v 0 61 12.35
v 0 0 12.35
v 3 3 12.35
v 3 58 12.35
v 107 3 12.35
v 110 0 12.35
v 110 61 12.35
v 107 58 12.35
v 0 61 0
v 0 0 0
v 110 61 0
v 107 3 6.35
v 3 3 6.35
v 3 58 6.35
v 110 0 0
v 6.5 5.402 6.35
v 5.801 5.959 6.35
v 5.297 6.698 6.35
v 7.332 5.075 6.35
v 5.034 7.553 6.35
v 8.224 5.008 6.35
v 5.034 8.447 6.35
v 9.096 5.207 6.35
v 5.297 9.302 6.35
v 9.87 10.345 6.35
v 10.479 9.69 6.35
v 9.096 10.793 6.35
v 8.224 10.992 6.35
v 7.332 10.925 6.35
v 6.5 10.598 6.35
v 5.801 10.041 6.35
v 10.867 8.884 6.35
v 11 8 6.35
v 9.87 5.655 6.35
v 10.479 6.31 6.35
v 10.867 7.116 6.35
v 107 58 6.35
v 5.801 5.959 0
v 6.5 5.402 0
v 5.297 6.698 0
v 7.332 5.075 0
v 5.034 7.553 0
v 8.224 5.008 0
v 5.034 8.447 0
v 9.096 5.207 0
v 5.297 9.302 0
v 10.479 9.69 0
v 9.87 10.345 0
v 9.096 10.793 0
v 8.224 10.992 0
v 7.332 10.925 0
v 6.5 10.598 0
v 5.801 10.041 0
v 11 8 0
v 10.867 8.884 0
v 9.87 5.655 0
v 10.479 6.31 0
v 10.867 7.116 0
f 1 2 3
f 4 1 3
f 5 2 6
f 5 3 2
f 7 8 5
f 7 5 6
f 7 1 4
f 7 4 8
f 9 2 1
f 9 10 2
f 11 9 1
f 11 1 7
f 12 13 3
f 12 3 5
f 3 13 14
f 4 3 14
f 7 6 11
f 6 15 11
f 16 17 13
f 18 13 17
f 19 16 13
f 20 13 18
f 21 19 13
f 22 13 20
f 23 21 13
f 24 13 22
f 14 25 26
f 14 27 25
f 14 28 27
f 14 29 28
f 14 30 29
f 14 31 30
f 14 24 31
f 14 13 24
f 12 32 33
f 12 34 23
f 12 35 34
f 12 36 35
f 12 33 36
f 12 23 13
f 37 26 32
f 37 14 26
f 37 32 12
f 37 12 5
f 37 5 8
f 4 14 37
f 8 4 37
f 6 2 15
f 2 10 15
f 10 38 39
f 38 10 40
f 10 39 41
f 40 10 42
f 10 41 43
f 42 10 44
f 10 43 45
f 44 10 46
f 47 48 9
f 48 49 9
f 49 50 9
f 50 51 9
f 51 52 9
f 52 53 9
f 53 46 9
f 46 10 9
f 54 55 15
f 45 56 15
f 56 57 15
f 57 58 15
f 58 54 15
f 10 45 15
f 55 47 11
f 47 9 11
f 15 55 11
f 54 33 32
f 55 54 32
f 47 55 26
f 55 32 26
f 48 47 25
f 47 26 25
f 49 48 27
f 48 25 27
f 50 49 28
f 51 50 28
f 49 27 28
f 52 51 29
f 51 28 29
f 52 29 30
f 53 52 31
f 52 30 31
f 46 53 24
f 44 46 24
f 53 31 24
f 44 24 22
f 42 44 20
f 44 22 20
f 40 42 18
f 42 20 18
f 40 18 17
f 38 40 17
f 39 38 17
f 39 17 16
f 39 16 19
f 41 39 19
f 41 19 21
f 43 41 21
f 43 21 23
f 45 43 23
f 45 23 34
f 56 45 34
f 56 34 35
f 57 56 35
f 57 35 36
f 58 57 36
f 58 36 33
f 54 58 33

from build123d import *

# Parameters (mm, degrees)
SKETCH1_W           = 110
SKETCH1_H           = 61
BOSS_EXTRUDE1_DEPTH = 6.35
SKETCH3_W           = 110
SKETCH3_H           = 61
SKETCH3_W_2         = 104
SKETCH3_H_2         = 55
BOSS_EXTRUDE2_DEPTH = 6
SKETCH5_R           = 3
CUT_EXTRUDE1_DEPTH  = 126.941742484


with BuildPart() as part:
    # Sketch1 → Boss-Extrude1 (new body)
    with BuildSketch(Plane.XY):
        with Locations((55, 30.5)):
            Rectangle(SKETCH1_W, SKETCH1_H)
    extrude(amount=BOSS_EXTRUDE1_DEPTH)

    # Sketch3 → Boss-Extrude2 (add)
    with BuildSketch(Plane.XY.offset(6.35)):
        with Locations((55, 30.5)):
            Rectangle(SKETCH3_W, SKETCH3_H)
        with Locations((55, 30.5)):
            Rectangle(SKETCH3_W_2, SKETCH3_H_2, mode=Mode.SUBTRACT)
    extrude(amount=BOSS_EXTRUDE2_DEPTH)

    # Sketch5 → Cut-Extrude1 (cut, through all)
    with BuildSketch(Plane.XY.offset(6.35)):
        with Locations((8, 8)):
            Circle(SKETCH5_R)
    extrude(amount=-CUT_EXTRUDE1_DEPTH, mode=Mode.SUBTRACT)


solid = part.part
